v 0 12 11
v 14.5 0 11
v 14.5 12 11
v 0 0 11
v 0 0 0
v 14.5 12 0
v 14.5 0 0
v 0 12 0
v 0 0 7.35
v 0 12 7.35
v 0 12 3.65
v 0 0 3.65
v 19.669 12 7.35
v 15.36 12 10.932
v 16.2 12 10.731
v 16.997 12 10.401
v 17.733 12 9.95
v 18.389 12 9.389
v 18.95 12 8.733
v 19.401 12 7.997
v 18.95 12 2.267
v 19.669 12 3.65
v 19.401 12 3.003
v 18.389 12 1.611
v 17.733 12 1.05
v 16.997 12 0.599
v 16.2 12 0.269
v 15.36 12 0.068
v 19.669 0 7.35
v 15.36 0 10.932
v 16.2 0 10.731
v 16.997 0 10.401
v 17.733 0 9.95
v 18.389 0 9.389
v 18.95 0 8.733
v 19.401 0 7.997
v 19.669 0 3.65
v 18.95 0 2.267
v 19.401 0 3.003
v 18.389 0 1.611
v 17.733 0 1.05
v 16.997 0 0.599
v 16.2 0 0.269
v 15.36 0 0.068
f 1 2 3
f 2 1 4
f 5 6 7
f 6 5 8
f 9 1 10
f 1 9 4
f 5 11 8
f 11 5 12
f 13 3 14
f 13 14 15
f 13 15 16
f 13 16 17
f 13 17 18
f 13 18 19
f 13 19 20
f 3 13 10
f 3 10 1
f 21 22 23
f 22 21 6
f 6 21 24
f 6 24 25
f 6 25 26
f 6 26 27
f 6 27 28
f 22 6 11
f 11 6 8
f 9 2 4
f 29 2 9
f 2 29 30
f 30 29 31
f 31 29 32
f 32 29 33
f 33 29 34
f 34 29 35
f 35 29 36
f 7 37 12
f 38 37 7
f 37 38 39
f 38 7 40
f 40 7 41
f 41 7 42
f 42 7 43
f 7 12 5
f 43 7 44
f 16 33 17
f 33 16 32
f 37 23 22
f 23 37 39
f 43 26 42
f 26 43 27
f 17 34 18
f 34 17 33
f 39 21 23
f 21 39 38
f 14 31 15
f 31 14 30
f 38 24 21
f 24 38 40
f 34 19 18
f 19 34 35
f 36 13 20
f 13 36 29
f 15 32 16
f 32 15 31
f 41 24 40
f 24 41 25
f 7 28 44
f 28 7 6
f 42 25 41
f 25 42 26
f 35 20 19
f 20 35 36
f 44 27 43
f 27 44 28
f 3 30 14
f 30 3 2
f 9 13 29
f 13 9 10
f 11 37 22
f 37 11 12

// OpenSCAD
//This is a holder for a laser maker.
//It is intended to hold laser line makers on our lasercutter.


//==========Define Geometry============
clr = 0.1;//mm
x_len= 20;//mm - Overall length
y_len= 12;//mm - Overall width
z_len= 11;//mm - Overall height
r_end= 5.5;//mm - x-end radius
pl_thk = 3.7;//mm - Plate thickness
r_hole = 1.5;//mm - radius of bolt hole


//==========Render====================
body();




//==========Modules===================
module body()
{
   
    difference() {
        outline();
        
        //subtract clearance for plate mount
        translate([0,0,(z_len-pl_thk)/2])
            cube([x_len,y_len,pl_thk]);
        
        //subtract hole for lasermount
        translate([x_len-r_end,0,z_len/2])
            rotate([-90,0,0])
            cylinder( h= y_len, r= r_hole, $fn = 40);
        
        
    };
        
};

module outline() {
    //Create outline of body
    union() {
        cube([x_len-r_end,y_len,z_len]);
        translate([x_len-r_end,0,r_end])
            rotate([-90,0,0])
                cylinder(h = y_len, r = r_end, $fn = 40);
        
        
    };
};
